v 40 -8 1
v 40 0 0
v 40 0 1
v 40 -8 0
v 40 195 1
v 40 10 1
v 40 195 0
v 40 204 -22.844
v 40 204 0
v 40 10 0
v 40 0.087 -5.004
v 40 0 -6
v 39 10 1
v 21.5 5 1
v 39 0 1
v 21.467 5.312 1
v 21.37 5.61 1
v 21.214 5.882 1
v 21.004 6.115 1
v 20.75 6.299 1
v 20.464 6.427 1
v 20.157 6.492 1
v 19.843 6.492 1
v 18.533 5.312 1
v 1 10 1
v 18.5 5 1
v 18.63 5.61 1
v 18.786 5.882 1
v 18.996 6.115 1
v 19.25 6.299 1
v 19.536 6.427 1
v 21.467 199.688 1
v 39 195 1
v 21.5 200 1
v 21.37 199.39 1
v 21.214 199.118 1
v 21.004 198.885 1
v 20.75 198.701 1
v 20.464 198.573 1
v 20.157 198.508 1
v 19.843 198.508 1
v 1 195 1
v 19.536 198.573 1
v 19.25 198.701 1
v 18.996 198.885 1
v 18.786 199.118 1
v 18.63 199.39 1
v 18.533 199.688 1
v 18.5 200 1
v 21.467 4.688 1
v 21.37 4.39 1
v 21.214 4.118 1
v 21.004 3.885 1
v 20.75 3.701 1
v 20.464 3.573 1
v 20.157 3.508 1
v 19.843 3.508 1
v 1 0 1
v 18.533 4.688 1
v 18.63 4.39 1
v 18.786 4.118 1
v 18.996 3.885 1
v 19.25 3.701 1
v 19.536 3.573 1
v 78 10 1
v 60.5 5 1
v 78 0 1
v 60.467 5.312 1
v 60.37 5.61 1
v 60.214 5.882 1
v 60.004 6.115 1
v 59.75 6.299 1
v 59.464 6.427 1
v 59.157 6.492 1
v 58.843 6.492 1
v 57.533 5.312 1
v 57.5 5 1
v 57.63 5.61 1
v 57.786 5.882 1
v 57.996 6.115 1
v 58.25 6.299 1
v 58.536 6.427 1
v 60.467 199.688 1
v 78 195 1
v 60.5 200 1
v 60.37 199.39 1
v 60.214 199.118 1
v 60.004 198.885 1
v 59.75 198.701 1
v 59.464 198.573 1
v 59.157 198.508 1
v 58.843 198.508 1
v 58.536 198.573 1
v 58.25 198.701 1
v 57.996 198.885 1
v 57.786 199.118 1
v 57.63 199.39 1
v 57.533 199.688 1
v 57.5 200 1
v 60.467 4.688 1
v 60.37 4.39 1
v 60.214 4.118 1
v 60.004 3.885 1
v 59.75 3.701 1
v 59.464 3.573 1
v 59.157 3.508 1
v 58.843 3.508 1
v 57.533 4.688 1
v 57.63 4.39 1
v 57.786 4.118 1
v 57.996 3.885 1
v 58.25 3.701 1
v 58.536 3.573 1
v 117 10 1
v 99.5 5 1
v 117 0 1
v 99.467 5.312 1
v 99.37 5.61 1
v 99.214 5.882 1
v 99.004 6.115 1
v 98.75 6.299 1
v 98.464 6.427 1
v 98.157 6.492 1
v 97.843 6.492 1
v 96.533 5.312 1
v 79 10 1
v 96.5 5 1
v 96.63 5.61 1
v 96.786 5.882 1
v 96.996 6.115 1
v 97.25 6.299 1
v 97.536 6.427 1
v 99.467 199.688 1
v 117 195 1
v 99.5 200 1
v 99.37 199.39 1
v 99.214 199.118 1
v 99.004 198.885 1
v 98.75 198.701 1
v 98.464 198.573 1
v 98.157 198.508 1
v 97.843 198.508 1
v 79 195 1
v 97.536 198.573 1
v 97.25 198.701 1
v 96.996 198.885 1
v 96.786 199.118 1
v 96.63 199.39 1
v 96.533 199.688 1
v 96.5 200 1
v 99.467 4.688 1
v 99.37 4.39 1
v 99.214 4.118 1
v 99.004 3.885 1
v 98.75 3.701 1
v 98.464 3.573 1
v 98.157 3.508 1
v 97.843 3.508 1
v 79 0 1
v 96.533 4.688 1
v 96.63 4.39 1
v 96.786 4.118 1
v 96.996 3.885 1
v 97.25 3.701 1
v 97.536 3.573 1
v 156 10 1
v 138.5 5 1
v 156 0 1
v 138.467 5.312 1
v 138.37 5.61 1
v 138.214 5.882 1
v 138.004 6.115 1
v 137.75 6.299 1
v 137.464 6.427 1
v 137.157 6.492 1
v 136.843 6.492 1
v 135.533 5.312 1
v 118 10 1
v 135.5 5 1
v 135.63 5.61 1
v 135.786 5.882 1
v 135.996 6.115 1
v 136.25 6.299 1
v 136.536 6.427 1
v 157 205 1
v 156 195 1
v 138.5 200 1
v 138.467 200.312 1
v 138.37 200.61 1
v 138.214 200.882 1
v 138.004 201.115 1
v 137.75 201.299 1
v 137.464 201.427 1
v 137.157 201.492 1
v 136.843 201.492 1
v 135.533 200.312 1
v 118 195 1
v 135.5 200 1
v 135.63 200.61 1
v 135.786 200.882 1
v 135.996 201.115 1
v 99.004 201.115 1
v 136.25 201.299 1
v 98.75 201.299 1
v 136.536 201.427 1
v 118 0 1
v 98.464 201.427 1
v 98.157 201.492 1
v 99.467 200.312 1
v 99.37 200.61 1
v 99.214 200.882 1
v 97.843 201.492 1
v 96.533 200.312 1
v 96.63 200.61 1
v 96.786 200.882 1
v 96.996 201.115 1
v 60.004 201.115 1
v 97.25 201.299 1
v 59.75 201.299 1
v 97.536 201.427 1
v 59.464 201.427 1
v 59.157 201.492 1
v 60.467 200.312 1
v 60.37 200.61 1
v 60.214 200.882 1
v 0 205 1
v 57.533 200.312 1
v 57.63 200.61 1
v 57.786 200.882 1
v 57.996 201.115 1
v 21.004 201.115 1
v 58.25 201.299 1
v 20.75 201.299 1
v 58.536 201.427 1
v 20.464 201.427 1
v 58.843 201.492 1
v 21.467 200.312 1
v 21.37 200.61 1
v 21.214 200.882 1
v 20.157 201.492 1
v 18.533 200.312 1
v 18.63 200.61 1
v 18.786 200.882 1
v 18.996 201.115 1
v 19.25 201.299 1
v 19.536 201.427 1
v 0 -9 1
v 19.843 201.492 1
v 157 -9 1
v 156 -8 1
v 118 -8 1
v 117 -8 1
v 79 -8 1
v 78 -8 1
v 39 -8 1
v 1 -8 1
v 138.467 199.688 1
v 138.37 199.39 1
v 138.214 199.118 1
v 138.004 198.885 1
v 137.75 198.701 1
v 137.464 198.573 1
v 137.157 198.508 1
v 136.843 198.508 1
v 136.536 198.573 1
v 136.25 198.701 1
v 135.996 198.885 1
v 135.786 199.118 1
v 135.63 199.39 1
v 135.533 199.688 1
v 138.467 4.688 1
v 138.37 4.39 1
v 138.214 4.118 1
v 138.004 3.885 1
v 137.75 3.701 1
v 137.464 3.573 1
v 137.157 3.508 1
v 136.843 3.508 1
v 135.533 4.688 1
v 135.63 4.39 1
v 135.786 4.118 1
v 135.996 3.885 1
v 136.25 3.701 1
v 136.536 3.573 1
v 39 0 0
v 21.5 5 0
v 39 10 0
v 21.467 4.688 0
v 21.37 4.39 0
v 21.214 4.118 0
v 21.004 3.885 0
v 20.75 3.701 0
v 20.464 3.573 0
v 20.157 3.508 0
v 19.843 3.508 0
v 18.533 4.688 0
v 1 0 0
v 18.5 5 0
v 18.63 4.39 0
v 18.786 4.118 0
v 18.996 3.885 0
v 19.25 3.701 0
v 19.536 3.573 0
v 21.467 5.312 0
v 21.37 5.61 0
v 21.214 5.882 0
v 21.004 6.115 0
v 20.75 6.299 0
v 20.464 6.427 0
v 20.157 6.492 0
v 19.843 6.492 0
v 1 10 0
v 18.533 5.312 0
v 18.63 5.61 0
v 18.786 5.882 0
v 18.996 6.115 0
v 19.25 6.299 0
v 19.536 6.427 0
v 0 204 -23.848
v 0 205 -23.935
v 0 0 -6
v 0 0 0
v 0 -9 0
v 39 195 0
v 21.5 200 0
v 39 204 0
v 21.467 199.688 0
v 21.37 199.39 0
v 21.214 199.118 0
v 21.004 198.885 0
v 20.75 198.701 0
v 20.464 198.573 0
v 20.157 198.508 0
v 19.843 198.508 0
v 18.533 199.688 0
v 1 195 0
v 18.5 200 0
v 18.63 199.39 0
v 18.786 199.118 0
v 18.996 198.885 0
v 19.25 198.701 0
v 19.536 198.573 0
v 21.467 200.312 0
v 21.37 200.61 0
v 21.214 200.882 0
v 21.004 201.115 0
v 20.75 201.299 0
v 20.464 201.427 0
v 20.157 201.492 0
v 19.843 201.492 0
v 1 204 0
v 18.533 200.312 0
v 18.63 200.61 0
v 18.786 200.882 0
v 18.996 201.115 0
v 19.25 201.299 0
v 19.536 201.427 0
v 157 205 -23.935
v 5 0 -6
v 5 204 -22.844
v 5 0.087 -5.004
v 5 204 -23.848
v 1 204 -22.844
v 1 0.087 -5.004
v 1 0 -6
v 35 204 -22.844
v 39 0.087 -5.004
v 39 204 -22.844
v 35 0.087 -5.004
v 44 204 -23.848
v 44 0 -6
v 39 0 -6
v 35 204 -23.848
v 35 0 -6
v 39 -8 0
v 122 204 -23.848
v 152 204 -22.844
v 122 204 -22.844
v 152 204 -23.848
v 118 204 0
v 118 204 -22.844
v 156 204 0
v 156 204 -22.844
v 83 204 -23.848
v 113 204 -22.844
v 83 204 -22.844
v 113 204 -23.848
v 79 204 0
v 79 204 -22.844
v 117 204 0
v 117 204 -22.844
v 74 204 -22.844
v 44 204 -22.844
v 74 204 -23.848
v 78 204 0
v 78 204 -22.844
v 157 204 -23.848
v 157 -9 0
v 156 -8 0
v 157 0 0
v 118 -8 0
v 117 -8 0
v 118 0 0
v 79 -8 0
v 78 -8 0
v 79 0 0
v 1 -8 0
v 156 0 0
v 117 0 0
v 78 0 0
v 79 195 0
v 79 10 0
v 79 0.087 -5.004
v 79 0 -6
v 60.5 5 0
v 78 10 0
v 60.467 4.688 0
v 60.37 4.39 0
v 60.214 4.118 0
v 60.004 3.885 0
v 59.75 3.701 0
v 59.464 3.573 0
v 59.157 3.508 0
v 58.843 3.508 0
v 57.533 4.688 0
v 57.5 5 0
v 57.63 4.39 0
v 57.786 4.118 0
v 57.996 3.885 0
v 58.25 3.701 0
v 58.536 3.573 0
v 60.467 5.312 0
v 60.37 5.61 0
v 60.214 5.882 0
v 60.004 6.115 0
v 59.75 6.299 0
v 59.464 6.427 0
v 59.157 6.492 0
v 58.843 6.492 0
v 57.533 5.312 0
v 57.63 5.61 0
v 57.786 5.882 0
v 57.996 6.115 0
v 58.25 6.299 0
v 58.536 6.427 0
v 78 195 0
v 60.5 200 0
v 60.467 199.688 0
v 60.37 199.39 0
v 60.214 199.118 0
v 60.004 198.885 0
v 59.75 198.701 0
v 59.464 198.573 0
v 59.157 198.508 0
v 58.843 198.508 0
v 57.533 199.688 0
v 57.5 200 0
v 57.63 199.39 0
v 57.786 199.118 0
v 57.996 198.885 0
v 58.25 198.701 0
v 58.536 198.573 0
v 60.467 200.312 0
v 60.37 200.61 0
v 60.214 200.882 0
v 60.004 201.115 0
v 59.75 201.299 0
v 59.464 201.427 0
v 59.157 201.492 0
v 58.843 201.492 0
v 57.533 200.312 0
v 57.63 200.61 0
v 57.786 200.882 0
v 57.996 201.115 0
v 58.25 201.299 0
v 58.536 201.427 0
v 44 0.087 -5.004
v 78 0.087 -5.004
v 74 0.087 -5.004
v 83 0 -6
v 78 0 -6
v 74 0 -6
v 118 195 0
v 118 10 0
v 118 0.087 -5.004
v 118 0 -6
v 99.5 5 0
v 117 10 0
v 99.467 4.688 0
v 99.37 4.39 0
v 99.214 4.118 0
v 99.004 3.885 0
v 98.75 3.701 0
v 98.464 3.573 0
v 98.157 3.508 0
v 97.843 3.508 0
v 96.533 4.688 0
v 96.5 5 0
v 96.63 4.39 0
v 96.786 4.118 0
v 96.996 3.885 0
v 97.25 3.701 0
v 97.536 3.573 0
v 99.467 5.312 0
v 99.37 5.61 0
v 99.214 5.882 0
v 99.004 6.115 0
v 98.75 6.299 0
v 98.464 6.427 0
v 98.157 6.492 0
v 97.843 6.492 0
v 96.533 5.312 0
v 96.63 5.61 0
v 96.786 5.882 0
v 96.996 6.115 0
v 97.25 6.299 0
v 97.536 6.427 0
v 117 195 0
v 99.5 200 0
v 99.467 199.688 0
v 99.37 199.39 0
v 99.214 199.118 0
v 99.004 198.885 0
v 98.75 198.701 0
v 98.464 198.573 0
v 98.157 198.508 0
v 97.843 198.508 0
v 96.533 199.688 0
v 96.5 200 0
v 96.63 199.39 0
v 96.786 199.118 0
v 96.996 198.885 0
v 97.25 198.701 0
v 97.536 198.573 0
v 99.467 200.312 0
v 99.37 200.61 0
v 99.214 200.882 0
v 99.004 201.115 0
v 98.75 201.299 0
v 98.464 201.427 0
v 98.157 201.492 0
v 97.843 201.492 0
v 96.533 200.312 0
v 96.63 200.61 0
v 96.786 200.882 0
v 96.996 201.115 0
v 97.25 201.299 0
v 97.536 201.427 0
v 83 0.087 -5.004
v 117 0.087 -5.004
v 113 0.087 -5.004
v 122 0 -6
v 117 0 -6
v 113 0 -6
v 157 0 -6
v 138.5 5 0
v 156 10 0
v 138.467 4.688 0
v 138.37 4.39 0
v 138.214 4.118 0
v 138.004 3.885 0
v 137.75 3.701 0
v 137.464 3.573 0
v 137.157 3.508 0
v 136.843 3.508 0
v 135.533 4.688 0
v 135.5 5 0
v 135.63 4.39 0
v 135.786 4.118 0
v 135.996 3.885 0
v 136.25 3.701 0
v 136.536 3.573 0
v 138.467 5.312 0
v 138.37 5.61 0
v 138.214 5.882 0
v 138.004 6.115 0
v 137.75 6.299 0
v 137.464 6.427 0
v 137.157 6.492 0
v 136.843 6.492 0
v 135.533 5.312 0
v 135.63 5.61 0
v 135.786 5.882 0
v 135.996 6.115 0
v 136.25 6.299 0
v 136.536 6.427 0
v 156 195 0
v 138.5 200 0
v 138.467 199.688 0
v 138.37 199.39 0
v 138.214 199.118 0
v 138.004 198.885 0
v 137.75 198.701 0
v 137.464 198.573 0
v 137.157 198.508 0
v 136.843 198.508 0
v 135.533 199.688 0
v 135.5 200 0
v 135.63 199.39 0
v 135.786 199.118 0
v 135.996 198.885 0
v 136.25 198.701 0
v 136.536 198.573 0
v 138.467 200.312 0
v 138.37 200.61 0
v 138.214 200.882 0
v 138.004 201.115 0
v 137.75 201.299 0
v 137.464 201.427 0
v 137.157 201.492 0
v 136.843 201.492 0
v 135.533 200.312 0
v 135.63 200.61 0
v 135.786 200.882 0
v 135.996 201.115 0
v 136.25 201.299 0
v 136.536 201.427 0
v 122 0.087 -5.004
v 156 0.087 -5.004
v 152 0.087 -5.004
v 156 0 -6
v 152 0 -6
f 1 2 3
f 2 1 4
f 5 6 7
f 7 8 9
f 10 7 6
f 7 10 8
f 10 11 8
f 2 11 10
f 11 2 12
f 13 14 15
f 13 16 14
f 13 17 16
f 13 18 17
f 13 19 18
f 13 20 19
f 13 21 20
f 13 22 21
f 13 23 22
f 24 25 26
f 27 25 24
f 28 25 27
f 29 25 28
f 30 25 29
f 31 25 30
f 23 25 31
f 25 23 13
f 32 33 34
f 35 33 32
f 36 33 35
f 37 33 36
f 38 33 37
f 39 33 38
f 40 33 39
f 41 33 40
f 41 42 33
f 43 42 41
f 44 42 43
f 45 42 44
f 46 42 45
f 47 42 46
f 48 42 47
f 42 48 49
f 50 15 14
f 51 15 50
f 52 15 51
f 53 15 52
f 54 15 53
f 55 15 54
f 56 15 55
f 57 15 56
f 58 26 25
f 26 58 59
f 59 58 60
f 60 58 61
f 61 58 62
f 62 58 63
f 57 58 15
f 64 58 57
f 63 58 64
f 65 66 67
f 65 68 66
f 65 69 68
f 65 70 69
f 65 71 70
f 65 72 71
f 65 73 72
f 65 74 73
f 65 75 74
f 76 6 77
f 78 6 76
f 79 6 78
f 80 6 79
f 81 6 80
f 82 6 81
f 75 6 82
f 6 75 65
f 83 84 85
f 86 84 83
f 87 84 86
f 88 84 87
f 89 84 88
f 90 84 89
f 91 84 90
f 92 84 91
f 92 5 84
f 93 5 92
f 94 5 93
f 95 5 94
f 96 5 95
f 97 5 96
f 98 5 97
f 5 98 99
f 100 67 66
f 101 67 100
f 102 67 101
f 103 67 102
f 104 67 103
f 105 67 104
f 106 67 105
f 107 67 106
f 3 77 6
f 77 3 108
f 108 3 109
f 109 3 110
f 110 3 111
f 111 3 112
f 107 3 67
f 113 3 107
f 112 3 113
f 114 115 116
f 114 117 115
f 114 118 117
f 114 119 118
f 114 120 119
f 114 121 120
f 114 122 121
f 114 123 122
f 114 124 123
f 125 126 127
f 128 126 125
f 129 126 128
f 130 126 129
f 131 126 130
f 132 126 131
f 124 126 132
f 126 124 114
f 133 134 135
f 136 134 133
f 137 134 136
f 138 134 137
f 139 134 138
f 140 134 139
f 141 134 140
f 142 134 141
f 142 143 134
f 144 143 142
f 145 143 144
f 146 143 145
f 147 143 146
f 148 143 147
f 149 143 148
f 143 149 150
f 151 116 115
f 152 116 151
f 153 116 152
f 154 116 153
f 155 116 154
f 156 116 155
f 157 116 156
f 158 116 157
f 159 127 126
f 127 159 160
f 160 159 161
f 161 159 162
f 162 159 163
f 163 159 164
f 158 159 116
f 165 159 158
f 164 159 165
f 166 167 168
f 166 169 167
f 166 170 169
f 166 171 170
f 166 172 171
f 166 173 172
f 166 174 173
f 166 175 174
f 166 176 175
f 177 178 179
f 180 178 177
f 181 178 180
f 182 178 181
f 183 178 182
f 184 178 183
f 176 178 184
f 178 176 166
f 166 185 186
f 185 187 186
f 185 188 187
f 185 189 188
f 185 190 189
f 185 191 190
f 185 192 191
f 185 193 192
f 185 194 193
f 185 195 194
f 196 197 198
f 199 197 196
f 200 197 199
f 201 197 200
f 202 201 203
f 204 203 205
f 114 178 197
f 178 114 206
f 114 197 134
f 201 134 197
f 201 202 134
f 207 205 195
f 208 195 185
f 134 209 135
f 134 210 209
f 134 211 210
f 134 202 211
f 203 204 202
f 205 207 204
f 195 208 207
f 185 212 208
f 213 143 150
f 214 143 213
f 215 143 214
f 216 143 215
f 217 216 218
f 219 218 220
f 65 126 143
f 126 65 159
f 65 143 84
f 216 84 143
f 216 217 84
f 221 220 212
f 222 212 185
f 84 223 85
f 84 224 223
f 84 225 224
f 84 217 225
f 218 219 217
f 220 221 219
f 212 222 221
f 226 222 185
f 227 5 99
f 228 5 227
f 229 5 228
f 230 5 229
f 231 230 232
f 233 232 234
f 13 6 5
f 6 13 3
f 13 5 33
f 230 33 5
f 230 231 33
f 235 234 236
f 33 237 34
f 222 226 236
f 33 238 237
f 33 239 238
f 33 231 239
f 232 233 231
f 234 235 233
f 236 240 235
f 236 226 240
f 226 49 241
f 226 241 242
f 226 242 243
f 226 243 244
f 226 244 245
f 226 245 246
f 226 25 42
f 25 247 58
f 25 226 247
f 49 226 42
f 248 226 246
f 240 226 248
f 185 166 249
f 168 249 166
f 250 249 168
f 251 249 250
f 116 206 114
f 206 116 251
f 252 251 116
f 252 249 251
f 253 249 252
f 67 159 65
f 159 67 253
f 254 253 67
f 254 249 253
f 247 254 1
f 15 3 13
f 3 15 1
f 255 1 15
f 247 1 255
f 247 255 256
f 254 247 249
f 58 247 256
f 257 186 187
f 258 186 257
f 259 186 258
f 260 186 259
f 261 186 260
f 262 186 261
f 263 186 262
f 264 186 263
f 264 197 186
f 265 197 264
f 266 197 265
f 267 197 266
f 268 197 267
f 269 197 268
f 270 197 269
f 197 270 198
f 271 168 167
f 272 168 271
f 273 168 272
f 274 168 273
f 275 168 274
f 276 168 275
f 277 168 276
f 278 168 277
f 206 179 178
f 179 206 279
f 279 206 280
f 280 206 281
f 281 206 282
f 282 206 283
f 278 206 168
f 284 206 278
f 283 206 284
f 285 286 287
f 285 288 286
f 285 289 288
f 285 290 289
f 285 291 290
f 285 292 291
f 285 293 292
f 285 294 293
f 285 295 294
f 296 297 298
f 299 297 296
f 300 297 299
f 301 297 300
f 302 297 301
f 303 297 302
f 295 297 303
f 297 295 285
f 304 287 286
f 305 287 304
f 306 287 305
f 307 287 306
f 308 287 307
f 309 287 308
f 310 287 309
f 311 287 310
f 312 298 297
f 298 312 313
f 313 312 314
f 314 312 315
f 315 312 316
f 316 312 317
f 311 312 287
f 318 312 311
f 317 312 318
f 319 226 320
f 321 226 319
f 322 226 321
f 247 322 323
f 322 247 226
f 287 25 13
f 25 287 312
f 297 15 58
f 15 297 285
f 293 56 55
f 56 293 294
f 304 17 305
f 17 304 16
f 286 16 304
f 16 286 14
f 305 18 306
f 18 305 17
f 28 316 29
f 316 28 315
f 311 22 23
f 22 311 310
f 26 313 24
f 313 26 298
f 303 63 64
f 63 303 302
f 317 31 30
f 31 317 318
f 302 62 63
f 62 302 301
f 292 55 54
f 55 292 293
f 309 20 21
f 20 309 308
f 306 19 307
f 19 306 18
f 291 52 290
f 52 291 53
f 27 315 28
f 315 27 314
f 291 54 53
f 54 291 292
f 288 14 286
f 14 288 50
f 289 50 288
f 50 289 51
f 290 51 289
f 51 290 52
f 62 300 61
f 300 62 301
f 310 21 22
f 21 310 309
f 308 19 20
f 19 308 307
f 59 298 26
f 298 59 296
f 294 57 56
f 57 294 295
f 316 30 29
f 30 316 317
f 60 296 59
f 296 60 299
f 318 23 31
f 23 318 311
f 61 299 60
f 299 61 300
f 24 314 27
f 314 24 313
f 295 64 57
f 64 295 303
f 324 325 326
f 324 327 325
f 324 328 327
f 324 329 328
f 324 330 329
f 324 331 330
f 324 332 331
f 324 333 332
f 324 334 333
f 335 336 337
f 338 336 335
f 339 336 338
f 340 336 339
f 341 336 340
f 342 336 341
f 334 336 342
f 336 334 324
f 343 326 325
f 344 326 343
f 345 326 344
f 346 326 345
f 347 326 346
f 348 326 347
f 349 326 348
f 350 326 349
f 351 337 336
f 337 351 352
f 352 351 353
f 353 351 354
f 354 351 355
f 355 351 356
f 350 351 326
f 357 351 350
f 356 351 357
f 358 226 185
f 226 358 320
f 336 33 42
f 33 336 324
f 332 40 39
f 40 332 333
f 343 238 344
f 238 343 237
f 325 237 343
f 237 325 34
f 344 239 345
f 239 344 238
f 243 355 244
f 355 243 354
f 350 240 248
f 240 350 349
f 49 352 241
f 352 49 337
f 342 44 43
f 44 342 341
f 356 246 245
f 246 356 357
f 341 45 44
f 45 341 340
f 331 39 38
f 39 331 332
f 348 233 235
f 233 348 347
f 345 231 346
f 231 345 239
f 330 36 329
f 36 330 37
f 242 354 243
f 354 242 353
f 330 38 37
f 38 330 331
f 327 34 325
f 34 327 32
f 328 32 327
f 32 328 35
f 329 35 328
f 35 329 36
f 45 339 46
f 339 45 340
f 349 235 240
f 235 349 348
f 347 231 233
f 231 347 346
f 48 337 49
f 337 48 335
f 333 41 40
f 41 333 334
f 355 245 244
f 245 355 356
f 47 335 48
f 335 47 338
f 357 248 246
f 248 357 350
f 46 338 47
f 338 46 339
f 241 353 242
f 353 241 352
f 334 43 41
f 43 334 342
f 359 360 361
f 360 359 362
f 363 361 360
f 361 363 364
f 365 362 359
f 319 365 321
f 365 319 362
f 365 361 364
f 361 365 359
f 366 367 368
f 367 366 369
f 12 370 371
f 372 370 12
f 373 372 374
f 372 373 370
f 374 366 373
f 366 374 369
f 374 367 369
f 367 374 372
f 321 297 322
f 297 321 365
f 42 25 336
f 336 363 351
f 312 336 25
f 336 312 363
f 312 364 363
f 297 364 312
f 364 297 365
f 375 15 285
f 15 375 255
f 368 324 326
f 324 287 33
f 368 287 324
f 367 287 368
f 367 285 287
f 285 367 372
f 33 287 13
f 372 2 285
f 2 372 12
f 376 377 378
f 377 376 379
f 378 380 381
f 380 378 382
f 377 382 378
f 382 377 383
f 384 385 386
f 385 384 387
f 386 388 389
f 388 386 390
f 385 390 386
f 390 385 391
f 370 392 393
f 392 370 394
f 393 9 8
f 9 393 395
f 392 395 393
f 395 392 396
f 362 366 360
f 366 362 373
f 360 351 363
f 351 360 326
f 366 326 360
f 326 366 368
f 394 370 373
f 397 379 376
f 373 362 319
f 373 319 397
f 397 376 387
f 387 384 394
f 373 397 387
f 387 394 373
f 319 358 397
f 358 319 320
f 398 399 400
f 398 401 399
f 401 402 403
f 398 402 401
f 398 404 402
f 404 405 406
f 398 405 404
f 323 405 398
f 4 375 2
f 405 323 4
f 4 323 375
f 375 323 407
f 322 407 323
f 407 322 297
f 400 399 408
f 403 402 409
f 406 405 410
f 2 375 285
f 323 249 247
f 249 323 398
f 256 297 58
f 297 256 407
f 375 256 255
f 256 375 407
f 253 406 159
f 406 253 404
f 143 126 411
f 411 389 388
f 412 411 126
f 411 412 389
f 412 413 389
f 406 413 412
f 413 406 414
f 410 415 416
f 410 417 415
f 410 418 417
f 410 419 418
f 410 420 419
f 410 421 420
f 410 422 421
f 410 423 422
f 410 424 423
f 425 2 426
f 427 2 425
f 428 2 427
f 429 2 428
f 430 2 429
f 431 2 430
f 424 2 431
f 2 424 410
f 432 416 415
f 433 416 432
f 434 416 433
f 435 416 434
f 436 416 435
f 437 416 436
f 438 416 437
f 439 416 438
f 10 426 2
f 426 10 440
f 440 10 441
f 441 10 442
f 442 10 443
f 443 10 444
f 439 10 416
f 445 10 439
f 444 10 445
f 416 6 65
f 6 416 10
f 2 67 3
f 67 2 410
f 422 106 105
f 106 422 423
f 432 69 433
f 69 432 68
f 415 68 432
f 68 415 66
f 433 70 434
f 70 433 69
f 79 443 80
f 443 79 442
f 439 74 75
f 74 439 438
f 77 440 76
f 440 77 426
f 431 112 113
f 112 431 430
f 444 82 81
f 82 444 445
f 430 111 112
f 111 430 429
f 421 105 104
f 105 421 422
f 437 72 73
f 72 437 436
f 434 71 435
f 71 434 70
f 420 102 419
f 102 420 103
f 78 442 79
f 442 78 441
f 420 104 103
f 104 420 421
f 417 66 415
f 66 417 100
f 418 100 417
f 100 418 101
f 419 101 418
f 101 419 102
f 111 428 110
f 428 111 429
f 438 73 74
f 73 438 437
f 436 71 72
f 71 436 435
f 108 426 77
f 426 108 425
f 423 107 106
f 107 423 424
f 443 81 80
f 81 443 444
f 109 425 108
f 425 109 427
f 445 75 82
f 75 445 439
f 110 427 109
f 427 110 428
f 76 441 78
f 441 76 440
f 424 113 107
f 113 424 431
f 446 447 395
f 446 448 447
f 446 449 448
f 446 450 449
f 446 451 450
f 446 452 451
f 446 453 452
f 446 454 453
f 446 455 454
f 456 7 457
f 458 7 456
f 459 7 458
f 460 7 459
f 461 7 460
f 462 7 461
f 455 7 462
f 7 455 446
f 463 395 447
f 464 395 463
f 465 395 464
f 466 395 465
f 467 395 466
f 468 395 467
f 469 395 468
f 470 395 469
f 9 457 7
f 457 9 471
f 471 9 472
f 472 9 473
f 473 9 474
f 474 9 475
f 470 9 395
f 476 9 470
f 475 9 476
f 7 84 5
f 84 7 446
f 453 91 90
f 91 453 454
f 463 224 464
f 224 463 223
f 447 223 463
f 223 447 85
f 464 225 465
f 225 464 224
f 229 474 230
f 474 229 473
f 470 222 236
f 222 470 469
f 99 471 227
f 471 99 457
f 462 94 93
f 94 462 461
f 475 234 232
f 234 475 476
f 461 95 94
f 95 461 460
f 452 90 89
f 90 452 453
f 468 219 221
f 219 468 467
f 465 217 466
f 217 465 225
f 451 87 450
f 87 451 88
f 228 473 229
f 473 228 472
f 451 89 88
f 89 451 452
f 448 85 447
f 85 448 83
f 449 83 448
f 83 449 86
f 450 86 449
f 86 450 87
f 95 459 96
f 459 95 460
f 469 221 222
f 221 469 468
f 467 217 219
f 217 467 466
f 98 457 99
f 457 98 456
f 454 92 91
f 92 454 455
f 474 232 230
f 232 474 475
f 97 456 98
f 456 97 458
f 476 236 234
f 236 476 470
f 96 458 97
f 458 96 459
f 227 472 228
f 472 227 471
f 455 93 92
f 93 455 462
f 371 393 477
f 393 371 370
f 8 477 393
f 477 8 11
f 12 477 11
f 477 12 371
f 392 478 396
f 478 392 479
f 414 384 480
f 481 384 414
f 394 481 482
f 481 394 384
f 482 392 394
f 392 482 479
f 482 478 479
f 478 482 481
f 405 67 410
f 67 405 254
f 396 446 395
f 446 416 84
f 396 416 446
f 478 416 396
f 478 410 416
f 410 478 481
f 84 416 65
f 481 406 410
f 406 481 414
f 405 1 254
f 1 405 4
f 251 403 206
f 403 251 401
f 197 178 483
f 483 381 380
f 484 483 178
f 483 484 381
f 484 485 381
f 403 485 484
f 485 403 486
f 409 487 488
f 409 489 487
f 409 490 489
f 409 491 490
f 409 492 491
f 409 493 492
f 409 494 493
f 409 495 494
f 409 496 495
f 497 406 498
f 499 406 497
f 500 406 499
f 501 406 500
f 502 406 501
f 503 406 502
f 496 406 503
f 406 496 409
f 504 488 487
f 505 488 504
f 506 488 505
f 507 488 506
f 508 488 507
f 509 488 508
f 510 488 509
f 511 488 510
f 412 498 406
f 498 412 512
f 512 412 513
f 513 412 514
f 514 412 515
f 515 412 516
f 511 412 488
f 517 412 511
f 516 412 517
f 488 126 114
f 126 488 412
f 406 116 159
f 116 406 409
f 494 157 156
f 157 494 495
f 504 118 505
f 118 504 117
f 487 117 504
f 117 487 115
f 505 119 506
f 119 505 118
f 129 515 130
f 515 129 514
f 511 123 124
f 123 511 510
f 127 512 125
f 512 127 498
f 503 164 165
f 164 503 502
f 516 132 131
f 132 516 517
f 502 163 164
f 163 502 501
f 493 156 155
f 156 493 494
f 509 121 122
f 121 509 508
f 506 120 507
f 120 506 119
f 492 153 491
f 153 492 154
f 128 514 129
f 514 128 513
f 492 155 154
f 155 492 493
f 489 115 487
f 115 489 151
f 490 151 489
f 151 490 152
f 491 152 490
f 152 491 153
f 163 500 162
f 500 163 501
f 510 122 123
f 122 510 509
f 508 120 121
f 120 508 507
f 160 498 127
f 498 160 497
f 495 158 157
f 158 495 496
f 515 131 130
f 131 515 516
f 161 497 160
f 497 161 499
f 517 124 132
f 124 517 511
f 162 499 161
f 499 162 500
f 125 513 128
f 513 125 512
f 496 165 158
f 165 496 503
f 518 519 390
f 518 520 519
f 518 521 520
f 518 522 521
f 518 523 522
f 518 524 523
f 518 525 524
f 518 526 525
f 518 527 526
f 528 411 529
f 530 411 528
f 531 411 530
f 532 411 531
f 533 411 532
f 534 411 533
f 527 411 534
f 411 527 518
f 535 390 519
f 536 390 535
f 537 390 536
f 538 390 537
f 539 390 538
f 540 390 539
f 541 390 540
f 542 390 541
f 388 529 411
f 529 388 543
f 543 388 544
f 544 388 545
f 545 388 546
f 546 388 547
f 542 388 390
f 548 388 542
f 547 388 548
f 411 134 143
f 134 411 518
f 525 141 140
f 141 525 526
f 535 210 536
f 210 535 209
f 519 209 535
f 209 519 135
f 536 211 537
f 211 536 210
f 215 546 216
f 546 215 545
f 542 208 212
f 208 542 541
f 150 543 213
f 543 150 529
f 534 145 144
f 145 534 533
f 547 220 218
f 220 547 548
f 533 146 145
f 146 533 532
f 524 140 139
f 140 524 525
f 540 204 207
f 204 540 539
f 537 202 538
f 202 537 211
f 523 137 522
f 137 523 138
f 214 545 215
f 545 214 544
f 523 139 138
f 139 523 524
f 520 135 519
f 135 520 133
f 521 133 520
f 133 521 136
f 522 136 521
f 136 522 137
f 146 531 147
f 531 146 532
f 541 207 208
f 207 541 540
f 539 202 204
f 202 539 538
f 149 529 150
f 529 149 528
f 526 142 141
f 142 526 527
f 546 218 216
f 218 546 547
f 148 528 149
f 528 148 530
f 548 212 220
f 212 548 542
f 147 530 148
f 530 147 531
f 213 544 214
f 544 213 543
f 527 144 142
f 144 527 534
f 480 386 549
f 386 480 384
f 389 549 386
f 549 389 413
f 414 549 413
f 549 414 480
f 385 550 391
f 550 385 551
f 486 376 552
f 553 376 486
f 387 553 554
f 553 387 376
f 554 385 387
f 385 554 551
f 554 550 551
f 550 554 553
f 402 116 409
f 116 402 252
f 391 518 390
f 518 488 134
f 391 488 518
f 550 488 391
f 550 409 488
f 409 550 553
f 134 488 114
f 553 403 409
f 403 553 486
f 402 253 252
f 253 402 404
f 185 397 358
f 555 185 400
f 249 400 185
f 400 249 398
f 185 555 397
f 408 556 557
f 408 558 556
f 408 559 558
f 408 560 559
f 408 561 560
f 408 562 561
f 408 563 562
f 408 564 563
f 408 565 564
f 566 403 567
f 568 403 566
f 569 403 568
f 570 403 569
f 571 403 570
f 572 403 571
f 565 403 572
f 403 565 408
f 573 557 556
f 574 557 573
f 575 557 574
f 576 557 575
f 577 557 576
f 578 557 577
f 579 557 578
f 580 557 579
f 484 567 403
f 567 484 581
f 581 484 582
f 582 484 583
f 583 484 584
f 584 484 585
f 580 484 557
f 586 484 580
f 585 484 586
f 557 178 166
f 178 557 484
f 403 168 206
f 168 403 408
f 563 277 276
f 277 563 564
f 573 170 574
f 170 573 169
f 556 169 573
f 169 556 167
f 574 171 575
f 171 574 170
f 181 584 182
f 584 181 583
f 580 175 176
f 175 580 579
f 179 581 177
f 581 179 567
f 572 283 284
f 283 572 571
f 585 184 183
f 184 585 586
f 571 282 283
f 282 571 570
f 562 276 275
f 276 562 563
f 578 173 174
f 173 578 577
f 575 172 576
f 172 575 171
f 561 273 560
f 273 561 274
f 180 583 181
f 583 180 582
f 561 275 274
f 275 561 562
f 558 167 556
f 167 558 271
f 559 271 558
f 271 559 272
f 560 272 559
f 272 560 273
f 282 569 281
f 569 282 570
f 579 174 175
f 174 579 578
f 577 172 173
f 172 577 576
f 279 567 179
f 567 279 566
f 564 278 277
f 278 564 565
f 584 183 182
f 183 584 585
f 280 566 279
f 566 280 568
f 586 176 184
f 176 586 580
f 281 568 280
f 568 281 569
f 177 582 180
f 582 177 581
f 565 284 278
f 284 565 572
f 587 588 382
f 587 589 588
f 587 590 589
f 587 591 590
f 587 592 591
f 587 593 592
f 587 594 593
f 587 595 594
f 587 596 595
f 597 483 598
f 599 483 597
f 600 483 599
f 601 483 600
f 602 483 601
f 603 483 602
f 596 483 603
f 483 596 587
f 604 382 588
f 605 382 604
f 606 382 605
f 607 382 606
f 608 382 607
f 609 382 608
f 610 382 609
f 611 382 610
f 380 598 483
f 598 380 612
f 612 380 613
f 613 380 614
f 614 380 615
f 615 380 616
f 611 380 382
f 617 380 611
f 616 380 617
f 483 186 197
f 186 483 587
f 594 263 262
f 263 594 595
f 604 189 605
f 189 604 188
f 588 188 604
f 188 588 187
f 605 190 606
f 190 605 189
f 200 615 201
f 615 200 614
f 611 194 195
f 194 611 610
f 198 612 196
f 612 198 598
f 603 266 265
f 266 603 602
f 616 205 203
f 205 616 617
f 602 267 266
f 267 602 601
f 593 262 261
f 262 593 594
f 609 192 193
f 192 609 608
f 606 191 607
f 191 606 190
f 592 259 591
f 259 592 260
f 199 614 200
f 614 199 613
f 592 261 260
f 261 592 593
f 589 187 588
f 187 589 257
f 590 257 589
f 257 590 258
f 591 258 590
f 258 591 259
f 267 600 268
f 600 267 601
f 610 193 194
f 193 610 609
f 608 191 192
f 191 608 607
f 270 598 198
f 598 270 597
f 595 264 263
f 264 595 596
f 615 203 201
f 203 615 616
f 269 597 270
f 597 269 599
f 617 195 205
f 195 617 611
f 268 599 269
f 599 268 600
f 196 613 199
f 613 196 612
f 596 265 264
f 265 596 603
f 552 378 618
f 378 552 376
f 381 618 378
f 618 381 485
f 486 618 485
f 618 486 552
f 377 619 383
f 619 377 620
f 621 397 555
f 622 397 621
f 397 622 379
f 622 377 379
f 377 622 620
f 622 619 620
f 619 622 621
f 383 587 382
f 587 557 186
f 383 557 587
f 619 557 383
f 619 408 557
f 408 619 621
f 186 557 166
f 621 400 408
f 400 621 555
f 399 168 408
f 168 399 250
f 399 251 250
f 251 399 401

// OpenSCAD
cup_rim_radius = 38 / 2; //Measured 37.0mm diameter.
cup_radius = 30 / 2; //Measured 29.6mm diameter.
rim_spacing = 5; //Measured 1.6mm thickness.
screw_radius = 1.5; //Guessed.

thickness = 1;
length = 205;
slope = 5;
screwplate_width = 10;
label_height = 8;
$fs = 0.2;

module screwplate() {
	difference() {
		cube([thickness * 2 + cup_rim_radius * 2, screwplate_width, thickness]);
		translate([thickness + cup_rim_radius, screwplate_width / 2, -1]) {
			cylinder(h=thickness + 2, r=screw_radius);
		}
	}
}

module column(title) {
	//Left side.
	cube([thickness + (cup_rim_radius - cup_radius), length, thickness]);
	hull() {
		cube([thickness, length, thickness]);
		rotate([slope, 0, 0]) {
			translate([0, 0, thickness * 2 + rim_spacing]) {
				cube([thickness, length, 0.01]);
			}
		}
	}

	//Right side.
	translate([thickness + cup_rim_radius + cup_radius, 0, 0]) {
		cube([thickness + (cup_rim_radius - cup_radius), length, thickness]);
		translate([cup_rim_radius - cup_radius, 0, 0]) {
			hull() {
				cube([thickness, length, thickness]);
				rotate([slope, 0, 0]) {
					translate([0, 0, thickness * 2 + rim_spacing]) {
						cube([thickness, length, 0.01]);
					}
				}
			}
		}
	}

	//Backplate.
	translate([0, length - thickness, 0]) {
		rotate([slope, 0, 0]) {
			cube([thickness * 2 + cup_rim_radius * 2, thickness, thickness + rim_spacing + sin(slope) * length + thickness]);
		}
	}

	//Screwplates.
	rotate([slope, 0, 0]) {
		translate([0, 0, thickness + rim_spacing]) {
			screwplate();
			translate([0, length - screwplate_width, 0]) {
				screwplate();
			}
		}
	}
}

module row() {
	screwplate();
	translate([0, length - screwplate_width, 0]) {
		screwplate();
	}
	
	//Bottom rim sliders.
	difference() {
		union() {
			translate([0, 0, -thickness - rim_spacing]) {
				rotate([-slope, 0, 0]) {
					cube([cup_rim_radius - cup_radius + thickness, length / cos(slope), thickness]);
				}
			}
			translate([thickness + cup_rim_radius + cup_radius, 0, -thickness - rim_spacing]) {
				rotate([-slope, 0, 0]) {
					cube([cup_rim_radius - cup_radius + thickness, length / cos(slope), thickness]);
				}
			}
		}
		translate([-1, length, -100]) {
			cube([thickness * 2 + cup_rim_radius * 2 + 2, thickness, 200]);
		}
	}

	//Sides.
	difference() {
		union() {
			hull() {
				cube([thickness, length, thickness]);
				translate([0, 0, -thickness - rim_spacing]) {
					rotate([-slope, 0, 0]) {
						cube([thickness, length / cos(slope), thickness]);
					}
				}
			}
			translate([thickness + cup_rim_radius * 2, 0, 0]) {
				hull() {
					cube([thickness, length, thickness]);
					translate([0, 0, -thickness - rim_spacing]) {
						rotate([-slope, 0, 0]) {
							cube([thickness, length / cos(slope), thickness]);
						}
					}
				}
			}
		}
		translate([-1, length, -100]) {
			cube([thickness * 2 + cup_rim_radius * 2 + 2, thickness, 200]);
		}
	}

	//Backplate.
	intersection() {
		translate([0, length - thickness, -rim_spacing - sin(slope) * length / cos(slope) - thickness]) {
			cube([thickness * 2 + cup_rim_radius * 2, thickness, rim_spacing + sin(slope) * length / cos(slope) + thickness * 2]);
		}
		translate([0, 0, -rim_spacing - thickness]) {
			rotate([-slope, 0, 0]) {
				cube([thickness * 2 + cup_rim_radius * 2, length * 2, 100]);
			}
		}
	}

	//Label holder.
	translate([0, -label_height - thickness, 0]) {
		difference() {
			cube([thickness * 2 + cup_rim_radius * 2, label_height + thickness, thickness]);
			translate([thickness, thickness, -1]) {
				cube([cup_rim_radius * 2, label_height, thickness + 2]);
			}
		}
	}
}

row();
translate([thickness + cup_rim_radius * 2, 0, 0]) {
	row();
}
translate([(thickness + cup_rim_radius * 2) * 2, 0, 0]) {
	row();
}
translate([(thickness + cup_rim_radius * 2) * 3, 0, 0]) {
	row();
}
